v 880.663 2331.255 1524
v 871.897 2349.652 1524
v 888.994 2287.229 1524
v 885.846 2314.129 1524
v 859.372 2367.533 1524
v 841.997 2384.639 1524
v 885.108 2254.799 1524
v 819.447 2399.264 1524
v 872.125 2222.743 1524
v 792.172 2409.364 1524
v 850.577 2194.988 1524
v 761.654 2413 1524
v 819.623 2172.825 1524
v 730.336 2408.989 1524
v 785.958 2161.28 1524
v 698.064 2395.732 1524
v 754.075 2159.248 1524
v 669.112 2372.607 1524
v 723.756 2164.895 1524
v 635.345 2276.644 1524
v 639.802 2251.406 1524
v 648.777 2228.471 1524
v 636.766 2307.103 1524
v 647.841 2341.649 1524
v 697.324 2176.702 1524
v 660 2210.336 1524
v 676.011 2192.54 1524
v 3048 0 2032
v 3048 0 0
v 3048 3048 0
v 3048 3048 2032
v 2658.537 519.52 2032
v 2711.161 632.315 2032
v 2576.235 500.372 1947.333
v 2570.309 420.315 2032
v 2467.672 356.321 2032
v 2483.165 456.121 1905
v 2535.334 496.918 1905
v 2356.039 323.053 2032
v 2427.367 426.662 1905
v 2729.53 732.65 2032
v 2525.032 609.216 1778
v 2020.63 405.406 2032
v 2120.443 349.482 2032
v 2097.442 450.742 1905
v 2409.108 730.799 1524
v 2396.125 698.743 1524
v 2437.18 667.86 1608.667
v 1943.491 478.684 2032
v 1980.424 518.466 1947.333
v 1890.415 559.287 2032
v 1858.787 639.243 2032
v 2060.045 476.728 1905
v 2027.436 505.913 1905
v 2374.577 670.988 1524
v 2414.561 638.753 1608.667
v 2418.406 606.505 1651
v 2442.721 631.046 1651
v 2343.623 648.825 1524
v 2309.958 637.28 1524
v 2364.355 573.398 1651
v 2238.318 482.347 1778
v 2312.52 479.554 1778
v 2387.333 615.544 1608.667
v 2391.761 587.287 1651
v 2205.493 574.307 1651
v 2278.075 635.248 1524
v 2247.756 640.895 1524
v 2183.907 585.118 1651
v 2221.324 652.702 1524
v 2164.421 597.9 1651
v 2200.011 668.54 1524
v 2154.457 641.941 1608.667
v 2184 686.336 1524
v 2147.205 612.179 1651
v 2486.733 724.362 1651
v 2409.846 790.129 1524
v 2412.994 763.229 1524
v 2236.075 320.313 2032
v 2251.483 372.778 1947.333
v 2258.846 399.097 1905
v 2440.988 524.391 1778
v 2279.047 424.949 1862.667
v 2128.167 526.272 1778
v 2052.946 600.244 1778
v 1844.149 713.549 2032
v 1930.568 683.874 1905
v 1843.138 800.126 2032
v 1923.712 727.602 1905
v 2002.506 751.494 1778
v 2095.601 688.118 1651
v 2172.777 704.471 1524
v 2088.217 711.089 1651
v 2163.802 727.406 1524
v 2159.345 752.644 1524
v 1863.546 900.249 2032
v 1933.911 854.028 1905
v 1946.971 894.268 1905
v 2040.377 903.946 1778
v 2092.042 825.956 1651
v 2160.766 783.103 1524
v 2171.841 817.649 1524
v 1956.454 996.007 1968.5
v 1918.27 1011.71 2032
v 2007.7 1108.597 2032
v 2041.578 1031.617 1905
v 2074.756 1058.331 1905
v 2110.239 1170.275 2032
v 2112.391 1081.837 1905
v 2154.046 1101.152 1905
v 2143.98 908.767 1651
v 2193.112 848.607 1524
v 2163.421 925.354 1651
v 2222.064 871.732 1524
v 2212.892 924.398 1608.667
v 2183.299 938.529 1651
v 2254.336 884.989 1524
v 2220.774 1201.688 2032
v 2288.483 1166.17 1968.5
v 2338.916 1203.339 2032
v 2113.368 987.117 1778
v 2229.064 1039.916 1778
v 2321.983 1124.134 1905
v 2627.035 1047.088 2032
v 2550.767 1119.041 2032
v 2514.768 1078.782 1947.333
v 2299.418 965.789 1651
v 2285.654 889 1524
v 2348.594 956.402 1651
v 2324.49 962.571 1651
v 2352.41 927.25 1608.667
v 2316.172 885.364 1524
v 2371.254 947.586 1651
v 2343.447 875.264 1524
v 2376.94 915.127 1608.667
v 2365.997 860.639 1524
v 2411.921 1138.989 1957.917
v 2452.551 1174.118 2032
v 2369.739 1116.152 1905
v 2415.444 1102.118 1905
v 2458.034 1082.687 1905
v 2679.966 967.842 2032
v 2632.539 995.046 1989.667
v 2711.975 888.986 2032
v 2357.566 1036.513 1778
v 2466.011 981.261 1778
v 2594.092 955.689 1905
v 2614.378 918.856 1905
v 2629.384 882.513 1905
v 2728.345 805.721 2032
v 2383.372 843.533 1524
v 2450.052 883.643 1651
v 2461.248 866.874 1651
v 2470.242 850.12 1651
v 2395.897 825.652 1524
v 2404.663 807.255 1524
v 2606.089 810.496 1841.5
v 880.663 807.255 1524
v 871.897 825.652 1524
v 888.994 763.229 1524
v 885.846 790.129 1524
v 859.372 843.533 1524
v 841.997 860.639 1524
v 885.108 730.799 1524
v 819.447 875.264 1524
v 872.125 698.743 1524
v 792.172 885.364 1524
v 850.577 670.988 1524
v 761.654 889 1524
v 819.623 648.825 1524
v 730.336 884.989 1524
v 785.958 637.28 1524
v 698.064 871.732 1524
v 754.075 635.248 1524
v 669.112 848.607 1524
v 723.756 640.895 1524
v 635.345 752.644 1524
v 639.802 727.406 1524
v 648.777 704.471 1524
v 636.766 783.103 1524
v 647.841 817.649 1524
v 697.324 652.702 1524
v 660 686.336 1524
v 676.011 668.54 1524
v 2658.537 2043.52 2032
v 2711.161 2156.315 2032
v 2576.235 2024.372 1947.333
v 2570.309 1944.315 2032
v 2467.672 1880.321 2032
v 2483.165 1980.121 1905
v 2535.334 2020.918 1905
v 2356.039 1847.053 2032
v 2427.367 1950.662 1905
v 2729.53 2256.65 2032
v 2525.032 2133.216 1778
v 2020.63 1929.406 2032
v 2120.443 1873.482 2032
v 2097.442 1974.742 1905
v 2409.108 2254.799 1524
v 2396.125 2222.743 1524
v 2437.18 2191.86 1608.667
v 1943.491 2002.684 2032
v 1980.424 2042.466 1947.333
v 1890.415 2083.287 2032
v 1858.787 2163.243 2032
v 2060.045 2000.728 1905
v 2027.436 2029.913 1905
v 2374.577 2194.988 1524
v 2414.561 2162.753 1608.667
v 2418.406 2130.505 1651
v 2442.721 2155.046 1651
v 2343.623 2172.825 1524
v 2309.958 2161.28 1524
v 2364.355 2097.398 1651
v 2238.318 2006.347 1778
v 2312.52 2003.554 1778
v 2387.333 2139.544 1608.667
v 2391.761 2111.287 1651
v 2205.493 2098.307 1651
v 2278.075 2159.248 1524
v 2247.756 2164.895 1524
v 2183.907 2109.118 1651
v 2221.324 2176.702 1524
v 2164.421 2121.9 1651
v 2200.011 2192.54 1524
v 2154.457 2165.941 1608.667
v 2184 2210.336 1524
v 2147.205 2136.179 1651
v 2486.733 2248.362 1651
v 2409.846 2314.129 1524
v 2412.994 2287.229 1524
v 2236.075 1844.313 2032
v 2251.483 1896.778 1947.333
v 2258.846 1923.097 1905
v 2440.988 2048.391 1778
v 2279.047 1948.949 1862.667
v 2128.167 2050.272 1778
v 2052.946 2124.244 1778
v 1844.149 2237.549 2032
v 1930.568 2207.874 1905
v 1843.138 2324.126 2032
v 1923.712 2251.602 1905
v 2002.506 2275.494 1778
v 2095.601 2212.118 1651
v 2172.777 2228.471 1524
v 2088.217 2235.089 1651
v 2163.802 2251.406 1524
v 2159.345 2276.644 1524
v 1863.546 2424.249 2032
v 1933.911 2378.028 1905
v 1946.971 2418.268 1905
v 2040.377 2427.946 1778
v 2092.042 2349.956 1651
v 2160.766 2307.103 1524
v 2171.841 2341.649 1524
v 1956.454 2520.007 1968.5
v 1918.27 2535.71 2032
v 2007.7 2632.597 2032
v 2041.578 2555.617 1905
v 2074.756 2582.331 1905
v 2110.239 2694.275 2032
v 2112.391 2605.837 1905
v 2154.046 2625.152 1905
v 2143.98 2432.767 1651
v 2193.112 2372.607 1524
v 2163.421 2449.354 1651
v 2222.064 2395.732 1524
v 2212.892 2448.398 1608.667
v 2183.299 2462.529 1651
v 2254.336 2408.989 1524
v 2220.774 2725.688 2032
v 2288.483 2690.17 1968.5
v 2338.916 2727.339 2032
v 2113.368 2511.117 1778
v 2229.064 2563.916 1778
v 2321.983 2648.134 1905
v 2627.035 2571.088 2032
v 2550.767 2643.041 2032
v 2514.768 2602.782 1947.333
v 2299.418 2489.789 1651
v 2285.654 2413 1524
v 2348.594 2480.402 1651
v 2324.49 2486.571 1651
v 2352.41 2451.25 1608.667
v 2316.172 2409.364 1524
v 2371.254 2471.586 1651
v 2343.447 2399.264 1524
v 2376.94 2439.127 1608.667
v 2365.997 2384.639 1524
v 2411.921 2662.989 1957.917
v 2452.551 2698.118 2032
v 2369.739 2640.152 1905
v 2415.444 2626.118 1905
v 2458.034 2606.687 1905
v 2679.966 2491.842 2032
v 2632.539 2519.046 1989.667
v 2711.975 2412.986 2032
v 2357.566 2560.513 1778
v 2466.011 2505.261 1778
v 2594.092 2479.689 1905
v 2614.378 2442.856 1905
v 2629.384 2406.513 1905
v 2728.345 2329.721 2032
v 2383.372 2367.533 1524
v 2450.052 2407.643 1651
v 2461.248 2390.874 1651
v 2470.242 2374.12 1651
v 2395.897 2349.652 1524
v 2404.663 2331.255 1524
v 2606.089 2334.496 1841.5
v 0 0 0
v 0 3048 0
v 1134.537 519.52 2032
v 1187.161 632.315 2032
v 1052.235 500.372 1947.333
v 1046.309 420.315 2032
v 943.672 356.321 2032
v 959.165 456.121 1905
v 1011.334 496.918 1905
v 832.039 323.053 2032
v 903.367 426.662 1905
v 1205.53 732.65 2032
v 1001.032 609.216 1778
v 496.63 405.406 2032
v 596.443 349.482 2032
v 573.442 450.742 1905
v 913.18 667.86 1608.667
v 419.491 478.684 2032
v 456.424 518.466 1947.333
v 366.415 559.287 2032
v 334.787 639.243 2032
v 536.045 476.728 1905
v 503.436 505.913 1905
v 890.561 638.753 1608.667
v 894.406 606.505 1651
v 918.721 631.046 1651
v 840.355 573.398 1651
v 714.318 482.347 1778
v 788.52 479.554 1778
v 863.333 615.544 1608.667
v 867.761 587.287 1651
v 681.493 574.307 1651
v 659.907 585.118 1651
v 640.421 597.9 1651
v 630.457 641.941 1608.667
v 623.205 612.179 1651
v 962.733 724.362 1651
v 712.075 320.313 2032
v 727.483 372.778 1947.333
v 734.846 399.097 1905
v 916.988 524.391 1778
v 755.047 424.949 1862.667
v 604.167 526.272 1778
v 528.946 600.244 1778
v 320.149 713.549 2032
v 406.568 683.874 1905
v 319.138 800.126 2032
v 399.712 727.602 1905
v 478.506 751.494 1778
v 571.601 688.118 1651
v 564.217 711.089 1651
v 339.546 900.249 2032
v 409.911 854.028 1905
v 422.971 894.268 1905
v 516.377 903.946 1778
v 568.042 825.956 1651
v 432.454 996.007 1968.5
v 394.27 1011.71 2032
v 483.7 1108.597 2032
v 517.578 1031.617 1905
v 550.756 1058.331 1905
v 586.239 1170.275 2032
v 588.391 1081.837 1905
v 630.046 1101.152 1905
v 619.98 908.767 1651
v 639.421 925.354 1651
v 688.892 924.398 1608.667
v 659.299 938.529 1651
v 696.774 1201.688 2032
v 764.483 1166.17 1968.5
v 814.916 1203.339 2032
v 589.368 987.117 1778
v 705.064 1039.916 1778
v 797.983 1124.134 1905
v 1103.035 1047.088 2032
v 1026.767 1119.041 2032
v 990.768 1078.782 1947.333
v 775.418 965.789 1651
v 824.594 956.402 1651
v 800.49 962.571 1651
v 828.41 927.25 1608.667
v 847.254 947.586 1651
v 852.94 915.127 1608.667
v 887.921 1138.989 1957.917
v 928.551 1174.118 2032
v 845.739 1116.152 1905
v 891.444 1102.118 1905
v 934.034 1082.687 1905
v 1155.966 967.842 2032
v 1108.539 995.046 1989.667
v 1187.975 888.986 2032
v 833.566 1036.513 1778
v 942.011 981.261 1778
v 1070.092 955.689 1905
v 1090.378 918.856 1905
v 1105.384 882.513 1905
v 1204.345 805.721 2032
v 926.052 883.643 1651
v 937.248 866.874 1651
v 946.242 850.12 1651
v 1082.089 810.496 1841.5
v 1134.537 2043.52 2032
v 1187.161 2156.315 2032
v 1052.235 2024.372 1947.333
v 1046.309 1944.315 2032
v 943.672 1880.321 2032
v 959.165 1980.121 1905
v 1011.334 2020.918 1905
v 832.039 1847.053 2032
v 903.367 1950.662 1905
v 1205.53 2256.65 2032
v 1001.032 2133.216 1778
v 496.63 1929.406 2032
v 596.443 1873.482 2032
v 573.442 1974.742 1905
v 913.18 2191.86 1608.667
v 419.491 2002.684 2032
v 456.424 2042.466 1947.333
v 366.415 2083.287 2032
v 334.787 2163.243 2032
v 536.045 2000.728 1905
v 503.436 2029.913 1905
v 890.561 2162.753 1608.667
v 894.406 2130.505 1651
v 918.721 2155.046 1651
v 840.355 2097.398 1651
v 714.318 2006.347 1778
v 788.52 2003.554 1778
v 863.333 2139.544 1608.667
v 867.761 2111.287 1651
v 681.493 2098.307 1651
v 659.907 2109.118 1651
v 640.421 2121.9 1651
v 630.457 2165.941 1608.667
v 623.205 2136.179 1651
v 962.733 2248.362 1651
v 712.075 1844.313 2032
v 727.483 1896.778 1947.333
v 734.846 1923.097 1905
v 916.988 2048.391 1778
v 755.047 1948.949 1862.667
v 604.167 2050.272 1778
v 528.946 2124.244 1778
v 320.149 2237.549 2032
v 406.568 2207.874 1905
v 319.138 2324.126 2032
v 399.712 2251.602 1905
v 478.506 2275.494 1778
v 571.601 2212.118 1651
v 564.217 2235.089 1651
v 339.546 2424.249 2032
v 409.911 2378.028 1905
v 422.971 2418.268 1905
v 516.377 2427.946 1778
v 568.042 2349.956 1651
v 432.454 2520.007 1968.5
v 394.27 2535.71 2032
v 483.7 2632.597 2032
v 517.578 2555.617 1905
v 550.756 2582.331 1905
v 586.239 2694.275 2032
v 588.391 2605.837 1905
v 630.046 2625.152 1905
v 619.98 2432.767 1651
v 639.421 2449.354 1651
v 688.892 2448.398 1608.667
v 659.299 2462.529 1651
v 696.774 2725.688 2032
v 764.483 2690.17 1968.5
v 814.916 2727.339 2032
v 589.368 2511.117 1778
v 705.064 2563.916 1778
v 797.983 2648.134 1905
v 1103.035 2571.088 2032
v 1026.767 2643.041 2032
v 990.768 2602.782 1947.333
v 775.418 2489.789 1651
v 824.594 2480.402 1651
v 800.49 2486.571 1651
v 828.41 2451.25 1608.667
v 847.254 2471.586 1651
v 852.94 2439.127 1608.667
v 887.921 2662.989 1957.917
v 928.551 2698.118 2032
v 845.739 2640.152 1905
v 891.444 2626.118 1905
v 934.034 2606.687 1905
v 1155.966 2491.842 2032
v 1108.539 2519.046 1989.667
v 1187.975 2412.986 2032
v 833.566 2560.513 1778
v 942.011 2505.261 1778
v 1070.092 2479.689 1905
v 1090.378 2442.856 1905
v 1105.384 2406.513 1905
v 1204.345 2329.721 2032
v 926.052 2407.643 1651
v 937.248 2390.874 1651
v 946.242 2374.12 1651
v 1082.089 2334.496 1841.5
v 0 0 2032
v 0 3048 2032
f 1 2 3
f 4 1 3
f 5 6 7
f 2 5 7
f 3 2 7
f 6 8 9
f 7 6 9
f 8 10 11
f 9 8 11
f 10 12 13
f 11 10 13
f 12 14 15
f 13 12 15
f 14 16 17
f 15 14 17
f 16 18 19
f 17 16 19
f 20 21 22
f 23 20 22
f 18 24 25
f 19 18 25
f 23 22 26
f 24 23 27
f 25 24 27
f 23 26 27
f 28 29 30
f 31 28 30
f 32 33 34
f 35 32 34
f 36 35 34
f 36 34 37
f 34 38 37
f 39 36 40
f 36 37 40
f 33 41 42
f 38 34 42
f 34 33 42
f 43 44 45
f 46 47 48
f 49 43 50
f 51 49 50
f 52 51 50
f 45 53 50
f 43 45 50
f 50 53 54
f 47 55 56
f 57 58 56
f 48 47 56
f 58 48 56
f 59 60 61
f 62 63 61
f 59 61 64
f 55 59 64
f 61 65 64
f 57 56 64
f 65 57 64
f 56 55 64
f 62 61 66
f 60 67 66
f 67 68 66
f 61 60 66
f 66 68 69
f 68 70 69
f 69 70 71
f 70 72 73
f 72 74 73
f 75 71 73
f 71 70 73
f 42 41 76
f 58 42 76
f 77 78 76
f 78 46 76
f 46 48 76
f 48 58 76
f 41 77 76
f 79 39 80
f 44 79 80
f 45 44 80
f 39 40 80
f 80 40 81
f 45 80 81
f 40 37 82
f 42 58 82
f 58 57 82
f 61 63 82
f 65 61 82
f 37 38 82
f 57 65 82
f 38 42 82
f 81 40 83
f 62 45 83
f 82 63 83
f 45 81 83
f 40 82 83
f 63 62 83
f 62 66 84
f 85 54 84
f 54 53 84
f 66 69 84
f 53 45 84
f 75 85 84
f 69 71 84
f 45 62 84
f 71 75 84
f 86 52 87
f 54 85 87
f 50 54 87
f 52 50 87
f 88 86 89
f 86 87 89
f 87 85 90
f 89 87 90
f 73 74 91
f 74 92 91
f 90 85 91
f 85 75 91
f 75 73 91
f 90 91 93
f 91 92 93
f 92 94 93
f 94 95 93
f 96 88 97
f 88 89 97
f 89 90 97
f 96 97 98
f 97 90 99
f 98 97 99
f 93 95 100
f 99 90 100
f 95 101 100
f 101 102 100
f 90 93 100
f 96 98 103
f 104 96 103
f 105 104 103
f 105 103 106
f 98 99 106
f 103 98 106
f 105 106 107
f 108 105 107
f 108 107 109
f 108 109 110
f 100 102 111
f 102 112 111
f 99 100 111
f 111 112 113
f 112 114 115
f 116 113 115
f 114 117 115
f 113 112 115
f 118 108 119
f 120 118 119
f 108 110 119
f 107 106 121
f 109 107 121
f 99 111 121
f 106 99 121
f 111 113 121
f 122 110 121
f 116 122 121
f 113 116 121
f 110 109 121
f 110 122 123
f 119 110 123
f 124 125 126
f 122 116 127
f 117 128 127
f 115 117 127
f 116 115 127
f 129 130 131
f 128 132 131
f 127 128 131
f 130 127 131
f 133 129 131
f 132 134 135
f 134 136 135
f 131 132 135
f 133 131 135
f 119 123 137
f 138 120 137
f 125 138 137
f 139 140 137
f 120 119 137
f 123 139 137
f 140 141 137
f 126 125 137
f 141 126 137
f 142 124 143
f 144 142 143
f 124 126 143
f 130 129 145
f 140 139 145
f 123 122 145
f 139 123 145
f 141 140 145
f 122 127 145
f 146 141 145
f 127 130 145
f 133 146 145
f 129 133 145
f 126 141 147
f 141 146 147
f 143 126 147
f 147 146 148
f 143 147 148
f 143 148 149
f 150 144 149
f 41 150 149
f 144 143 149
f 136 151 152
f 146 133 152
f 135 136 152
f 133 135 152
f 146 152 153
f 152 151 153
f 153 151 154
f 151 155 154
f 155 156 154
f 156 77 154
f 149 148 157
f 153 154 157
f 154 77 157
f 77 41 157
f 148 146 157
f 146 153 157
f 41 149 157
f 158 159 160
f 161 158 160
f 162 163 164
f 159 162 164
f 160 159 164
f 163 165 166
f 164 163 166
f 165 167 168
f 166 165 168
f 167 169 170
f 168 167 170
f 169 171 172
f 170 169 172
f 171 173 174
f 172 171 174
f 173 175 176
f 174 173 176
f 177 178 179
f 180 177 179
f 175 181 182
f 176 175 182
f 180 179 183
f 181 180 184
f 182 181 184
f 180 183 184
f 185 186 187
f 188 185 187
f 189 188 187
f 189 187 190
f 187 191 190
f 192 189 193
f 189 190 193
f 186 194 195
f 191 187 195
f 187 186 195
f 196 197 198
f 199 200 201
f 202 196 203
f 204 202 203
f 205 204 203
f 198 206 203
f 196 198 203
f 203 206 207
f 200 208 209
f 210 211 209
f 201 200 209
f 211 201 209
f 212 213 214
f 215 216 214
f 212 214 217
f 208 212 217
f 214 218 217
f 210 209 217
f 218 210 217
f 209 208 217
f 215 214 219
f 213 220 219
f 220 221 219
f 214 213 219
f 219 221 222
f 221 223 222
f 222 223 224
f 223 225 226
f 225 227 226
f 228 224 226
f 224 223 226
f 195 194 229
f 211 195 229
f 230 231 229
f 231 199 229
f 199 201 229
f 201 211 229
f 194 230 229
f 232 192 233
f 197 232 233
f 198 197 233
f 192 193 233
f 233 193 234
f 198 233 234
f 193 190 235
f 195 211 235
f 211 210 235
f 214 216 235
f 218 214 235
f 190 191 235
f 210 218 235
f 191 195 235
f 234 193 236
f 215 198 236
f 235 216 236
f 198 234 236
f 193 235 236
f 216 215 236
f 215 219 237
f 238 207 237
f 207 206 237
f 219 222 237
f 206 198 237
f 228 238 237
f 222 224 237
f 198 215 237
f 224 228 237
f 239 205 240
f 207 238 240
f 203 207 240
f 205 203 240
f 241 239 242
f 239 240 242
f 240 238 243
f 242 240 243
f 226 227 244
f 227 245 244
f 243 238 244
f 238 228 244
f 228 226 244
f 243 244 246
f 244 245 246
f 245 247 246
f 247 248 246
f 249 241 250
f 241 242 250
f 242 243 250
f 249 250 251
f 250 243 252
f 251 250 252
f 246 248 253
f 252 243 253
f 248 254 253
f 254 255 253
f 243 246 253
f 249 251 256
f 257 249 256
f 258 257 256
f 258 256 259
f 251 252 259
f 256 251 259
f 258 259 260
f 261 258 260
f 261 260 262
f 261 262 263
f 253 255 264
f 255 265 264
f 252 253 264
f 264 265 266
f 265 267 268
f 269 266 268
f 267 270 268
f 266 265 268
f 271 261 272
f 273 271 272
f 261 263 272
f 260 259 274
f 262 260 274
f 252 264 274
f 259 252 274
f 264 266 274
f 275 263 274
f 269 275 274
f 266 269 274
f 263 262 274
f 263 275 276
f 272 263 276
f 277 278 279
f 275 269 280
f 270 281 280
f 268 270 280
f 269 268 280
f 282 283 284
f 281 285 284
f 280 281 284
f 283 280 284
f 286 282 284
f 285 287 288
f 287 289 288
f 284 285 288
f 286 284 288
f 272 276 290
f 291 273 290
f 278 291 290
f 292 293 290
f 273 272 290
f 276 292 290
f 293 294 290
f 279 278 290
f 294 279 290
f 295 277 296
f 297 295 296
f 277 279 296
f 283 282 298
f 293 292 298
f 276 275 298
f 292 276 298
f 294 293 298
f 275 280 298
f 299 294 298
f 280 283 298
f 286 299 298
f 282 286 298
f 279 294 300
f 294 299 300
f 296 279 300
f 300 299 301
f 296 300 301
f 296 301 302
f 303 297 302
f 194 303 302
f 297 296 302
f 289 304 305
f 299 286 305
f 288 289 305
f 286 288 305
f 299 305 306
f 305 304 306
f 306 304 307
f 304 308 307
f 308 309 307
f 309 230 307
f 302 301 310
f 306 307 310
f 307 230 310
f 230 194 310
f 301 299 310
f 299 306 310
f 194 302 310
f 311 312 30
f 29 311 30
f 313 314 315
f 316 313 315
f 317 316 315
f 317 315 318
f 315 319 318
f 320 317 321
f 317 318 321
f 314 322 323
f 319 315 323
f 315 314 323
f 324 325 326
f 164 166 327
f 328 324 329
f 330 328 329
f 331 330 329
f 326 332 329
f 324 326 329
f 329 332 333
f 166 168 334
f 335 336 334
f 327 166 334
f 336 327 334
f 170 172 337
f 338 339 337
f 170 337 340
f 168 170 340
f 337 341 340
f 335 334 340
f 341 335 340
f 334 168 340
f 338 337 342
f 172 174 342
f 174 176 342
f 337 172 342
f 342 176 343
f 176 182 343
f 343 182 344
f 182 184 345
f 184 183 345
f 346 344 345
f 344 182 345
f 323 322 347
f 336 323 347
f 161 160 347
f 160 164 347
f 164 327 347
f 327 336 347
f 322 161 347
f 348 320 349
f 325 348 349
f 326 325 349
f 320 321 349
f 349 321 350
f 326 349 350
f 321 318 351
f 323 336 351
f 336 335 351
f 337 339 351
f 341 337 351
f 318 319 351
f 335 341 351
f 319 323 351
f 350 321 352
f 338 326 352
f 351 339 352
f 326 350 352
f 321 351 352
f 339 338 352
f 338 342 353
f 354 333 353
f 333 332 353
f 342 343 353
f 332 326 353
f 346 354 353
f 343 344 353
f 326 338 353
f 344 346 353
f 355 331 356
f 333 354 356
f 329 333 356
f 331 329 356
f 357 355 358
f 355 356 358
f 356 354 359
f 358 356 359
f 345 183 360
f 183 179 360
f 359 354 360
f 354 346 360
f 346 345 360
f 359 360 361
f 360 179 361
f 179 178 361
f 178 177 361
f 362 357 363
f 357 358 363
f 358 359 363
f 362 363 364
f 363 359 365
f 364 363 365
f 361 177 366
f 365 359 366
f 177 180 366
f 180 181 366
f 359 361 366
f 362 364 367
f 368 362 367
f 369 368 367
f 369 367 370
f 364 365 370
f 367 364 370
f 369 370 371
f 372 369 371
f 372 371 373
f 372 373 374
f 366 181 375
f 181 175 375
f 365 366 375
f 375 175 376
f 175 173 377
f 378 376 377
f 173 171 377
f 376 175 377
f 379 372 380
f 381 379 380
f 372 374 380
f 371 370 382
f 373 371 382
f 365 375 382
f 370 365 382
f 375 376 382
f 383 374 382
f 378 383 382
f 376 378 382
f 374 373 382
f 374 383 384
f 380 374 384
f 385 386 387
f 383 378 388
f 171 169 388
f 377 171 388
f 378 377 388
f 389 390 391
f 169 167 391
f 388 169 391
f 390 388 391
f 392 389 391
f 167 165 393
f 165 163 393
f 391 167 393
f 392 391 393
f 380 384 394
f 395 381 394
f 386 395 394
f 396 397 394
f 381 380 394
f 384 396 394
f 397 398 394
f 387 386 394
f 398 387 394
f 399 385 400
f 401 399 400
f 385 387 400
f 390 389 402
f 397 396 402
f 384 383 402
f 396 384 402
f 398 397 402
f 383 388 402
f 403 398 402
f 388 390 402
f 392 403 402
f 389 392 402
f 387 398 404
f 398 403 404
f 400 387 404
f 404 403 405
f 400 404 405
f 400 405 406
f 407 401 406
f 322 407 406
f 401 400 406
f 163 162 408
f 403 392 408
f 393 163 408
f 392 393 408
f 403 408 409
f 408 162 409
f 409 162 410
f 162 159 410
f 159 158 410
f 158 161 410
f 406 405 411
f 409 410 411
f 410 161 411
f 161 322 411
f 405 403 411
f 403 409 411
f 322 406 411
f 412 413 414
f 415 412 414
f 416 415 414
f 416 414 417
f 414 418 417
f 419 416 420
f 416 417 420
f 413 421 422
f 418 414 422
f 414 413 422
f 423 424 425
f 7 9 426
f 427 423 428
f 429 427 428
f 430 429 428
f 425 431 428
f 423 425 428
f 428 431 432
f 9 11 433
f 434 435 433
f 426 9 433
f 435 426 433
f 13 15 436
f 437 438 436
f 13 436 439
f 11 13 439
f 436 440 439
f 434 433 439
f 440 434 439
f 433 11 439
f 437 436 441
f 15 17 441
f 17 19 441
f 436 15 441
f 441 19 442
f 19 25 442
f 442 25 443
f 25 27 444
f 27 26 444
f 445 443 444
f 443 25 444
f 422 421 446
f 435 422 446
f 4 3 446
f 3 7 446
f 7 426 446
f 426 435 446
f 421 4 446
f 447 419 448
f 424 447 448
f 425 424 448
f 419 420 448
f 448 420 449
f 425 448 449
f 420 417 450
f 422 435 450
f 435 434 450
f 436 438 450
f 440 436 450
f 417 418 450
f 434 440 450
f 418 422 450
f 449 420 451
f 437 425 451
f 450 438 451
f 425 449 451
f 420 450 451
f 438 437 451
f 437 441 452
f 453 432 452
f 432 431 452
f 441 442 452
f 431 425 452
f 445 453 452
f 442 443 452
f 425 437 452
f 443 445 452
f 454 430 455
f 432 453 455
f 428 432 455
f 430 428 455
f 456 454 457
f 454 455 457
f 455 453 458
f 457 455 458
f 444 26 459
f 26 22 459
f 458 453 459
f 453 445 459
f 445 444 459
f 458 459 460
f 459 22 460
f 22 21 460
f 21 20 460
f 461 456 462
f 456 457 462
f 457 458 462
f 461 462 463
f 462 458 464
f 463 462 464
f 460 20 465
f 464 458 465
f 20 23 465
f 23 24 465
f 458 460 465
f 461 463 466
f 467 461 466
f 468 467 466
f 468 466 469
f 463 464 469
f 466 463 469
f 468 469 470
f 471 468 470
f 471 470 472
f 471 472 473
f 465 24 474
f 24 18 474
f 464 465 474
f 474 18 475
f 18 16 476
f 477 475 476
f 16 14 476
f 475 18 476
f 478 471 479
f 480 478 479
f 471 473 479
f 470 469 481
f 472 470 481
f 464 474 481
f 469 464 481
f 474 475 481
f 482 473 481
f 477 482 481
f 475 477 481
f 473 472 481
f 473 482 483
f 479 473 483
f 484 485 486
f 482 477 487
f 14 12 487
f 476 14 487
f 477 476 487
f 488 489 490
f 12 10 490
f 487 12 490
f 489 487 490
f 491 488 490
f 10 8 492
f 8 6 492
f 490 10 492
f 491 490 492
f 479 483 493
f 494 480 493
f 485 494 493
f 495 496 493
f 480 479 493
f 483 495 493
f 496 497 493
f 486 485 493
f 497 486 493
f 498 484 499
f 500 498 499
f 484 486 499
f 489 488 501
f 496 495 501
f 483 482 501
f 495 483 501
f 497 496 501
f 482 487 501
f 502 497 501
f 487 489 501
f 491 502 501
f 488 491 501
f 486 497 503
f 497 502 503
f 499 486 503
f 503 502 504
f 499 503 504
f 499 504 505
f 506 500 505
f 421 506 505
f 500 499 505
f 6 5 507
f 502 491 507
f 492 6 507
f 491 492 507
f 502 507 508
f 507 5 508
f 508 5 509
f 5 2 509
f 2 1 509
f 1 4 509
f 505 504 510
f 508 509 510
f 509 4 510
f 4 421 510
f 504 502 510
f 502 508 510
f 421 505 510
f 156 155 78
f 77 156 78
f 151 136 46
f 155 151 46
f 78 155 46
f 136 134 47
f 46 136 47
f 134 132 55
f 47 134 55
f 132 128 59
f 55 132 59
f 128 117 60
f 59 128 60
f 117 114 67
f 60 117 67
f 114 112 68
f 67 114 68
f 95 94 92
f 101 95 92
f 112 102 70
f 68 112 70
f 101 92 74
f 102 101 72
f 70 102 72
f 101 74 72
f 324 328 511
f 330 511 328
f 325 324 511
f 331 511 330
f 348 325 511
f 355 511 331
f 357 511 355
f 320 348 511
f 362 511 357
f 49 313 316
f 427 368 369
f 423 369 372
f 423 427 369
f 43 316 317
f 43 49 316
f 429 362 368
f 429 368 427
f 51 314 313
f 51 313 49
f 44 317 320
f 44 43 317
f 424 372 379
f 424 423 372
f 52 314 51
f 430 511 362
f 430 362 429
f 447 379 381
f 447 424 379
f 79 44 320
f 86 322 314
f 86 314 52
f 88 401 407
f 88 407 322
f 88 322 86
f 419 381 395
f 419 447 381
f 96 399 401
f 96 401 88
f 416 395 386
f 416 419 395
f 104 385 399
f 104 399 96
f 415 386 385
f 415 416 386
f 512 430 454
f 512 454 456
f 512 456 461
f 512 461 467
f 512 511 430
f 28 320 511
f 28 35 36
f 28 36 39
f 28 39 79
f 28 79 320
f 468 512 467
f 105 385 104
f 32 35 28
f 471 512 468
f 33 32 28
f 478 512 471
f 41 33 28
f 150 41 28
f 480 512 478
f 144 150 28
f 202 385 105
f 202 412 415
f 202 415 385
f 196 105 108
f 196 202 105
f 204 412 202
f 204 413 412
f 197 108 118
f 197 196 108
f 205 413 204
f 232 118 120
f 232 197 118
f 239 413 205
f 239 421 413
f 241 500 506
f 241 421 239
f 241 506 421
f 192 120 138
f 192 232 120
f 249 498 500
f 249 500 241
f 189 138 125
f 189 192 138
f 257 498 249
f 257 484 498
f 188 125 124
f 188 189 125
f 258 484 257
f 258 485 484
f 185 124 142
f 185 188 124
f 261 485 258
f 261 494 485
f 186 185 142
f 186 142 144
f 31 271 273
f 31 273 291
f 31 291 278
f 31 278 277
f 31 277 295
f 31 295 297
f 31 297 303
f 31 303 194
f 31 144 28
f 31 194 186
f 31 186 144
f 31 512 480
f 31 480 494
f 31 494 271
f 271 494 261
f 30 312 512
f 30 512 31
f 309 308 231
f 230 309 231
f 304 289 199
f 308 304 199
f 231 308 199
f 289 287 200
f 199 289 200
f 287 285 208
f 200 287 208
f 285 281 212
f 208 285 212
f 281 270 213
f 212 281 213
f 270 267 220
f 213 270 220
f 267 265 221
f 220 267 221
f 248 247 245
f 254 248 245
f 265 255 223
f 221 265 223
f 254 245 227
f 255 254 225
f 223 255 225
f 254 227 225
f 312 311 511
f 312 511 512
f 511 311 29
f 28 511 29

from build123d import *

# Parameters (mm, degrees)
SKETCH1_W            = 3048
SKETCH1_H            = 3048
BOSS_EXTRUDE1_DEPTH  = 2032
LPATTERN1_COUNT      = 2
LPATTERN1_PITCH      = 1524
LPATTERN1_COUNT_DIR2 = 2
LPATTERN1_PITCH_DIR2 = 1524


with BuildPart() as part:
    # Sketch1 → Boss-Extrude1 (new body)
    with BuildSketch(Plane.XY):
        with Locations((1524, 1524)):
            Rectangle(SKETCH1_W, SKETCH1_H)
    extrude(amount=BOSS_EXTRUDE1_DEPTH)

    # Cut-Loft1: read off the stored shape, not the designer's step
    # Cut-Loft1: loft between two sections, ruled curve by curve
    cut_loft1_from = [
        Edge.make_bspline([(1205.529987554, 2256.650380911, 2032), (1146.830749375, 1369.590405804, 2032), (259.770774268, 1428.289643982, 2032), (318.470012446, 2315.349619089, 2032), (377.169250625, 3202.409594196, 2032), (1264.229225732, 3143.710356018, 2032), (1205.529987554, 2256.650380911, 2032)], [0, 0, 0, 0, 0.5, 0.5, 0.5, 1, 1, 1, 1], 3, [1, 0.333333333, 0.333333333, 1, 0.333333333, 0.333333333, 1]),
    ]
    cut_loft1_to = [
        Edge.make_bspline([(885.845653168, 2314.129240859, 1524), (942.104134886, 2066.437934522, 1524), (694.412828549, 2010.179452804, 1524), (638.154346832, 2257.870759141, 1524), (581.895865114, 2505.562065478, 1524), (829.587171451, 2561.820547196, 1524), (885.845653168, 2314.129240859, 1524)], [0, 0, 0, 0, 0.5, 0.5, 0.5, 1, 1, 1, 1], 3, [1, 0.333333333, 0.333333333, 1, 0.333333333, 0.333333333, 1]),
    ]
    cut_loft1 = Solid(Shell([*[Face.make_surface_from_curves(cut_loft1_from[k], cut_loft1_to[k]) for k in range(1)], Face(Wire(cut_loft1_from)), Face(Wire(cut_loft1_to))]))
    add(cut_loft1, mode=Mode.SUBTRACT)

    # LPattern1: Cut-Loft1 2 × 2
    with Locations(*[(i * LPATTERN1_PITCH, -j * LPATTERN1_PITCH_DIR2, 0) for i in range(LPATTERN1_COUNT) for j in range(LPATTERN1_COUNT_DIR2) if (i, j) != (0, 0)]):
        add(cut_loft1, mode=Mode.SUBTRACT)


solid = part.part
